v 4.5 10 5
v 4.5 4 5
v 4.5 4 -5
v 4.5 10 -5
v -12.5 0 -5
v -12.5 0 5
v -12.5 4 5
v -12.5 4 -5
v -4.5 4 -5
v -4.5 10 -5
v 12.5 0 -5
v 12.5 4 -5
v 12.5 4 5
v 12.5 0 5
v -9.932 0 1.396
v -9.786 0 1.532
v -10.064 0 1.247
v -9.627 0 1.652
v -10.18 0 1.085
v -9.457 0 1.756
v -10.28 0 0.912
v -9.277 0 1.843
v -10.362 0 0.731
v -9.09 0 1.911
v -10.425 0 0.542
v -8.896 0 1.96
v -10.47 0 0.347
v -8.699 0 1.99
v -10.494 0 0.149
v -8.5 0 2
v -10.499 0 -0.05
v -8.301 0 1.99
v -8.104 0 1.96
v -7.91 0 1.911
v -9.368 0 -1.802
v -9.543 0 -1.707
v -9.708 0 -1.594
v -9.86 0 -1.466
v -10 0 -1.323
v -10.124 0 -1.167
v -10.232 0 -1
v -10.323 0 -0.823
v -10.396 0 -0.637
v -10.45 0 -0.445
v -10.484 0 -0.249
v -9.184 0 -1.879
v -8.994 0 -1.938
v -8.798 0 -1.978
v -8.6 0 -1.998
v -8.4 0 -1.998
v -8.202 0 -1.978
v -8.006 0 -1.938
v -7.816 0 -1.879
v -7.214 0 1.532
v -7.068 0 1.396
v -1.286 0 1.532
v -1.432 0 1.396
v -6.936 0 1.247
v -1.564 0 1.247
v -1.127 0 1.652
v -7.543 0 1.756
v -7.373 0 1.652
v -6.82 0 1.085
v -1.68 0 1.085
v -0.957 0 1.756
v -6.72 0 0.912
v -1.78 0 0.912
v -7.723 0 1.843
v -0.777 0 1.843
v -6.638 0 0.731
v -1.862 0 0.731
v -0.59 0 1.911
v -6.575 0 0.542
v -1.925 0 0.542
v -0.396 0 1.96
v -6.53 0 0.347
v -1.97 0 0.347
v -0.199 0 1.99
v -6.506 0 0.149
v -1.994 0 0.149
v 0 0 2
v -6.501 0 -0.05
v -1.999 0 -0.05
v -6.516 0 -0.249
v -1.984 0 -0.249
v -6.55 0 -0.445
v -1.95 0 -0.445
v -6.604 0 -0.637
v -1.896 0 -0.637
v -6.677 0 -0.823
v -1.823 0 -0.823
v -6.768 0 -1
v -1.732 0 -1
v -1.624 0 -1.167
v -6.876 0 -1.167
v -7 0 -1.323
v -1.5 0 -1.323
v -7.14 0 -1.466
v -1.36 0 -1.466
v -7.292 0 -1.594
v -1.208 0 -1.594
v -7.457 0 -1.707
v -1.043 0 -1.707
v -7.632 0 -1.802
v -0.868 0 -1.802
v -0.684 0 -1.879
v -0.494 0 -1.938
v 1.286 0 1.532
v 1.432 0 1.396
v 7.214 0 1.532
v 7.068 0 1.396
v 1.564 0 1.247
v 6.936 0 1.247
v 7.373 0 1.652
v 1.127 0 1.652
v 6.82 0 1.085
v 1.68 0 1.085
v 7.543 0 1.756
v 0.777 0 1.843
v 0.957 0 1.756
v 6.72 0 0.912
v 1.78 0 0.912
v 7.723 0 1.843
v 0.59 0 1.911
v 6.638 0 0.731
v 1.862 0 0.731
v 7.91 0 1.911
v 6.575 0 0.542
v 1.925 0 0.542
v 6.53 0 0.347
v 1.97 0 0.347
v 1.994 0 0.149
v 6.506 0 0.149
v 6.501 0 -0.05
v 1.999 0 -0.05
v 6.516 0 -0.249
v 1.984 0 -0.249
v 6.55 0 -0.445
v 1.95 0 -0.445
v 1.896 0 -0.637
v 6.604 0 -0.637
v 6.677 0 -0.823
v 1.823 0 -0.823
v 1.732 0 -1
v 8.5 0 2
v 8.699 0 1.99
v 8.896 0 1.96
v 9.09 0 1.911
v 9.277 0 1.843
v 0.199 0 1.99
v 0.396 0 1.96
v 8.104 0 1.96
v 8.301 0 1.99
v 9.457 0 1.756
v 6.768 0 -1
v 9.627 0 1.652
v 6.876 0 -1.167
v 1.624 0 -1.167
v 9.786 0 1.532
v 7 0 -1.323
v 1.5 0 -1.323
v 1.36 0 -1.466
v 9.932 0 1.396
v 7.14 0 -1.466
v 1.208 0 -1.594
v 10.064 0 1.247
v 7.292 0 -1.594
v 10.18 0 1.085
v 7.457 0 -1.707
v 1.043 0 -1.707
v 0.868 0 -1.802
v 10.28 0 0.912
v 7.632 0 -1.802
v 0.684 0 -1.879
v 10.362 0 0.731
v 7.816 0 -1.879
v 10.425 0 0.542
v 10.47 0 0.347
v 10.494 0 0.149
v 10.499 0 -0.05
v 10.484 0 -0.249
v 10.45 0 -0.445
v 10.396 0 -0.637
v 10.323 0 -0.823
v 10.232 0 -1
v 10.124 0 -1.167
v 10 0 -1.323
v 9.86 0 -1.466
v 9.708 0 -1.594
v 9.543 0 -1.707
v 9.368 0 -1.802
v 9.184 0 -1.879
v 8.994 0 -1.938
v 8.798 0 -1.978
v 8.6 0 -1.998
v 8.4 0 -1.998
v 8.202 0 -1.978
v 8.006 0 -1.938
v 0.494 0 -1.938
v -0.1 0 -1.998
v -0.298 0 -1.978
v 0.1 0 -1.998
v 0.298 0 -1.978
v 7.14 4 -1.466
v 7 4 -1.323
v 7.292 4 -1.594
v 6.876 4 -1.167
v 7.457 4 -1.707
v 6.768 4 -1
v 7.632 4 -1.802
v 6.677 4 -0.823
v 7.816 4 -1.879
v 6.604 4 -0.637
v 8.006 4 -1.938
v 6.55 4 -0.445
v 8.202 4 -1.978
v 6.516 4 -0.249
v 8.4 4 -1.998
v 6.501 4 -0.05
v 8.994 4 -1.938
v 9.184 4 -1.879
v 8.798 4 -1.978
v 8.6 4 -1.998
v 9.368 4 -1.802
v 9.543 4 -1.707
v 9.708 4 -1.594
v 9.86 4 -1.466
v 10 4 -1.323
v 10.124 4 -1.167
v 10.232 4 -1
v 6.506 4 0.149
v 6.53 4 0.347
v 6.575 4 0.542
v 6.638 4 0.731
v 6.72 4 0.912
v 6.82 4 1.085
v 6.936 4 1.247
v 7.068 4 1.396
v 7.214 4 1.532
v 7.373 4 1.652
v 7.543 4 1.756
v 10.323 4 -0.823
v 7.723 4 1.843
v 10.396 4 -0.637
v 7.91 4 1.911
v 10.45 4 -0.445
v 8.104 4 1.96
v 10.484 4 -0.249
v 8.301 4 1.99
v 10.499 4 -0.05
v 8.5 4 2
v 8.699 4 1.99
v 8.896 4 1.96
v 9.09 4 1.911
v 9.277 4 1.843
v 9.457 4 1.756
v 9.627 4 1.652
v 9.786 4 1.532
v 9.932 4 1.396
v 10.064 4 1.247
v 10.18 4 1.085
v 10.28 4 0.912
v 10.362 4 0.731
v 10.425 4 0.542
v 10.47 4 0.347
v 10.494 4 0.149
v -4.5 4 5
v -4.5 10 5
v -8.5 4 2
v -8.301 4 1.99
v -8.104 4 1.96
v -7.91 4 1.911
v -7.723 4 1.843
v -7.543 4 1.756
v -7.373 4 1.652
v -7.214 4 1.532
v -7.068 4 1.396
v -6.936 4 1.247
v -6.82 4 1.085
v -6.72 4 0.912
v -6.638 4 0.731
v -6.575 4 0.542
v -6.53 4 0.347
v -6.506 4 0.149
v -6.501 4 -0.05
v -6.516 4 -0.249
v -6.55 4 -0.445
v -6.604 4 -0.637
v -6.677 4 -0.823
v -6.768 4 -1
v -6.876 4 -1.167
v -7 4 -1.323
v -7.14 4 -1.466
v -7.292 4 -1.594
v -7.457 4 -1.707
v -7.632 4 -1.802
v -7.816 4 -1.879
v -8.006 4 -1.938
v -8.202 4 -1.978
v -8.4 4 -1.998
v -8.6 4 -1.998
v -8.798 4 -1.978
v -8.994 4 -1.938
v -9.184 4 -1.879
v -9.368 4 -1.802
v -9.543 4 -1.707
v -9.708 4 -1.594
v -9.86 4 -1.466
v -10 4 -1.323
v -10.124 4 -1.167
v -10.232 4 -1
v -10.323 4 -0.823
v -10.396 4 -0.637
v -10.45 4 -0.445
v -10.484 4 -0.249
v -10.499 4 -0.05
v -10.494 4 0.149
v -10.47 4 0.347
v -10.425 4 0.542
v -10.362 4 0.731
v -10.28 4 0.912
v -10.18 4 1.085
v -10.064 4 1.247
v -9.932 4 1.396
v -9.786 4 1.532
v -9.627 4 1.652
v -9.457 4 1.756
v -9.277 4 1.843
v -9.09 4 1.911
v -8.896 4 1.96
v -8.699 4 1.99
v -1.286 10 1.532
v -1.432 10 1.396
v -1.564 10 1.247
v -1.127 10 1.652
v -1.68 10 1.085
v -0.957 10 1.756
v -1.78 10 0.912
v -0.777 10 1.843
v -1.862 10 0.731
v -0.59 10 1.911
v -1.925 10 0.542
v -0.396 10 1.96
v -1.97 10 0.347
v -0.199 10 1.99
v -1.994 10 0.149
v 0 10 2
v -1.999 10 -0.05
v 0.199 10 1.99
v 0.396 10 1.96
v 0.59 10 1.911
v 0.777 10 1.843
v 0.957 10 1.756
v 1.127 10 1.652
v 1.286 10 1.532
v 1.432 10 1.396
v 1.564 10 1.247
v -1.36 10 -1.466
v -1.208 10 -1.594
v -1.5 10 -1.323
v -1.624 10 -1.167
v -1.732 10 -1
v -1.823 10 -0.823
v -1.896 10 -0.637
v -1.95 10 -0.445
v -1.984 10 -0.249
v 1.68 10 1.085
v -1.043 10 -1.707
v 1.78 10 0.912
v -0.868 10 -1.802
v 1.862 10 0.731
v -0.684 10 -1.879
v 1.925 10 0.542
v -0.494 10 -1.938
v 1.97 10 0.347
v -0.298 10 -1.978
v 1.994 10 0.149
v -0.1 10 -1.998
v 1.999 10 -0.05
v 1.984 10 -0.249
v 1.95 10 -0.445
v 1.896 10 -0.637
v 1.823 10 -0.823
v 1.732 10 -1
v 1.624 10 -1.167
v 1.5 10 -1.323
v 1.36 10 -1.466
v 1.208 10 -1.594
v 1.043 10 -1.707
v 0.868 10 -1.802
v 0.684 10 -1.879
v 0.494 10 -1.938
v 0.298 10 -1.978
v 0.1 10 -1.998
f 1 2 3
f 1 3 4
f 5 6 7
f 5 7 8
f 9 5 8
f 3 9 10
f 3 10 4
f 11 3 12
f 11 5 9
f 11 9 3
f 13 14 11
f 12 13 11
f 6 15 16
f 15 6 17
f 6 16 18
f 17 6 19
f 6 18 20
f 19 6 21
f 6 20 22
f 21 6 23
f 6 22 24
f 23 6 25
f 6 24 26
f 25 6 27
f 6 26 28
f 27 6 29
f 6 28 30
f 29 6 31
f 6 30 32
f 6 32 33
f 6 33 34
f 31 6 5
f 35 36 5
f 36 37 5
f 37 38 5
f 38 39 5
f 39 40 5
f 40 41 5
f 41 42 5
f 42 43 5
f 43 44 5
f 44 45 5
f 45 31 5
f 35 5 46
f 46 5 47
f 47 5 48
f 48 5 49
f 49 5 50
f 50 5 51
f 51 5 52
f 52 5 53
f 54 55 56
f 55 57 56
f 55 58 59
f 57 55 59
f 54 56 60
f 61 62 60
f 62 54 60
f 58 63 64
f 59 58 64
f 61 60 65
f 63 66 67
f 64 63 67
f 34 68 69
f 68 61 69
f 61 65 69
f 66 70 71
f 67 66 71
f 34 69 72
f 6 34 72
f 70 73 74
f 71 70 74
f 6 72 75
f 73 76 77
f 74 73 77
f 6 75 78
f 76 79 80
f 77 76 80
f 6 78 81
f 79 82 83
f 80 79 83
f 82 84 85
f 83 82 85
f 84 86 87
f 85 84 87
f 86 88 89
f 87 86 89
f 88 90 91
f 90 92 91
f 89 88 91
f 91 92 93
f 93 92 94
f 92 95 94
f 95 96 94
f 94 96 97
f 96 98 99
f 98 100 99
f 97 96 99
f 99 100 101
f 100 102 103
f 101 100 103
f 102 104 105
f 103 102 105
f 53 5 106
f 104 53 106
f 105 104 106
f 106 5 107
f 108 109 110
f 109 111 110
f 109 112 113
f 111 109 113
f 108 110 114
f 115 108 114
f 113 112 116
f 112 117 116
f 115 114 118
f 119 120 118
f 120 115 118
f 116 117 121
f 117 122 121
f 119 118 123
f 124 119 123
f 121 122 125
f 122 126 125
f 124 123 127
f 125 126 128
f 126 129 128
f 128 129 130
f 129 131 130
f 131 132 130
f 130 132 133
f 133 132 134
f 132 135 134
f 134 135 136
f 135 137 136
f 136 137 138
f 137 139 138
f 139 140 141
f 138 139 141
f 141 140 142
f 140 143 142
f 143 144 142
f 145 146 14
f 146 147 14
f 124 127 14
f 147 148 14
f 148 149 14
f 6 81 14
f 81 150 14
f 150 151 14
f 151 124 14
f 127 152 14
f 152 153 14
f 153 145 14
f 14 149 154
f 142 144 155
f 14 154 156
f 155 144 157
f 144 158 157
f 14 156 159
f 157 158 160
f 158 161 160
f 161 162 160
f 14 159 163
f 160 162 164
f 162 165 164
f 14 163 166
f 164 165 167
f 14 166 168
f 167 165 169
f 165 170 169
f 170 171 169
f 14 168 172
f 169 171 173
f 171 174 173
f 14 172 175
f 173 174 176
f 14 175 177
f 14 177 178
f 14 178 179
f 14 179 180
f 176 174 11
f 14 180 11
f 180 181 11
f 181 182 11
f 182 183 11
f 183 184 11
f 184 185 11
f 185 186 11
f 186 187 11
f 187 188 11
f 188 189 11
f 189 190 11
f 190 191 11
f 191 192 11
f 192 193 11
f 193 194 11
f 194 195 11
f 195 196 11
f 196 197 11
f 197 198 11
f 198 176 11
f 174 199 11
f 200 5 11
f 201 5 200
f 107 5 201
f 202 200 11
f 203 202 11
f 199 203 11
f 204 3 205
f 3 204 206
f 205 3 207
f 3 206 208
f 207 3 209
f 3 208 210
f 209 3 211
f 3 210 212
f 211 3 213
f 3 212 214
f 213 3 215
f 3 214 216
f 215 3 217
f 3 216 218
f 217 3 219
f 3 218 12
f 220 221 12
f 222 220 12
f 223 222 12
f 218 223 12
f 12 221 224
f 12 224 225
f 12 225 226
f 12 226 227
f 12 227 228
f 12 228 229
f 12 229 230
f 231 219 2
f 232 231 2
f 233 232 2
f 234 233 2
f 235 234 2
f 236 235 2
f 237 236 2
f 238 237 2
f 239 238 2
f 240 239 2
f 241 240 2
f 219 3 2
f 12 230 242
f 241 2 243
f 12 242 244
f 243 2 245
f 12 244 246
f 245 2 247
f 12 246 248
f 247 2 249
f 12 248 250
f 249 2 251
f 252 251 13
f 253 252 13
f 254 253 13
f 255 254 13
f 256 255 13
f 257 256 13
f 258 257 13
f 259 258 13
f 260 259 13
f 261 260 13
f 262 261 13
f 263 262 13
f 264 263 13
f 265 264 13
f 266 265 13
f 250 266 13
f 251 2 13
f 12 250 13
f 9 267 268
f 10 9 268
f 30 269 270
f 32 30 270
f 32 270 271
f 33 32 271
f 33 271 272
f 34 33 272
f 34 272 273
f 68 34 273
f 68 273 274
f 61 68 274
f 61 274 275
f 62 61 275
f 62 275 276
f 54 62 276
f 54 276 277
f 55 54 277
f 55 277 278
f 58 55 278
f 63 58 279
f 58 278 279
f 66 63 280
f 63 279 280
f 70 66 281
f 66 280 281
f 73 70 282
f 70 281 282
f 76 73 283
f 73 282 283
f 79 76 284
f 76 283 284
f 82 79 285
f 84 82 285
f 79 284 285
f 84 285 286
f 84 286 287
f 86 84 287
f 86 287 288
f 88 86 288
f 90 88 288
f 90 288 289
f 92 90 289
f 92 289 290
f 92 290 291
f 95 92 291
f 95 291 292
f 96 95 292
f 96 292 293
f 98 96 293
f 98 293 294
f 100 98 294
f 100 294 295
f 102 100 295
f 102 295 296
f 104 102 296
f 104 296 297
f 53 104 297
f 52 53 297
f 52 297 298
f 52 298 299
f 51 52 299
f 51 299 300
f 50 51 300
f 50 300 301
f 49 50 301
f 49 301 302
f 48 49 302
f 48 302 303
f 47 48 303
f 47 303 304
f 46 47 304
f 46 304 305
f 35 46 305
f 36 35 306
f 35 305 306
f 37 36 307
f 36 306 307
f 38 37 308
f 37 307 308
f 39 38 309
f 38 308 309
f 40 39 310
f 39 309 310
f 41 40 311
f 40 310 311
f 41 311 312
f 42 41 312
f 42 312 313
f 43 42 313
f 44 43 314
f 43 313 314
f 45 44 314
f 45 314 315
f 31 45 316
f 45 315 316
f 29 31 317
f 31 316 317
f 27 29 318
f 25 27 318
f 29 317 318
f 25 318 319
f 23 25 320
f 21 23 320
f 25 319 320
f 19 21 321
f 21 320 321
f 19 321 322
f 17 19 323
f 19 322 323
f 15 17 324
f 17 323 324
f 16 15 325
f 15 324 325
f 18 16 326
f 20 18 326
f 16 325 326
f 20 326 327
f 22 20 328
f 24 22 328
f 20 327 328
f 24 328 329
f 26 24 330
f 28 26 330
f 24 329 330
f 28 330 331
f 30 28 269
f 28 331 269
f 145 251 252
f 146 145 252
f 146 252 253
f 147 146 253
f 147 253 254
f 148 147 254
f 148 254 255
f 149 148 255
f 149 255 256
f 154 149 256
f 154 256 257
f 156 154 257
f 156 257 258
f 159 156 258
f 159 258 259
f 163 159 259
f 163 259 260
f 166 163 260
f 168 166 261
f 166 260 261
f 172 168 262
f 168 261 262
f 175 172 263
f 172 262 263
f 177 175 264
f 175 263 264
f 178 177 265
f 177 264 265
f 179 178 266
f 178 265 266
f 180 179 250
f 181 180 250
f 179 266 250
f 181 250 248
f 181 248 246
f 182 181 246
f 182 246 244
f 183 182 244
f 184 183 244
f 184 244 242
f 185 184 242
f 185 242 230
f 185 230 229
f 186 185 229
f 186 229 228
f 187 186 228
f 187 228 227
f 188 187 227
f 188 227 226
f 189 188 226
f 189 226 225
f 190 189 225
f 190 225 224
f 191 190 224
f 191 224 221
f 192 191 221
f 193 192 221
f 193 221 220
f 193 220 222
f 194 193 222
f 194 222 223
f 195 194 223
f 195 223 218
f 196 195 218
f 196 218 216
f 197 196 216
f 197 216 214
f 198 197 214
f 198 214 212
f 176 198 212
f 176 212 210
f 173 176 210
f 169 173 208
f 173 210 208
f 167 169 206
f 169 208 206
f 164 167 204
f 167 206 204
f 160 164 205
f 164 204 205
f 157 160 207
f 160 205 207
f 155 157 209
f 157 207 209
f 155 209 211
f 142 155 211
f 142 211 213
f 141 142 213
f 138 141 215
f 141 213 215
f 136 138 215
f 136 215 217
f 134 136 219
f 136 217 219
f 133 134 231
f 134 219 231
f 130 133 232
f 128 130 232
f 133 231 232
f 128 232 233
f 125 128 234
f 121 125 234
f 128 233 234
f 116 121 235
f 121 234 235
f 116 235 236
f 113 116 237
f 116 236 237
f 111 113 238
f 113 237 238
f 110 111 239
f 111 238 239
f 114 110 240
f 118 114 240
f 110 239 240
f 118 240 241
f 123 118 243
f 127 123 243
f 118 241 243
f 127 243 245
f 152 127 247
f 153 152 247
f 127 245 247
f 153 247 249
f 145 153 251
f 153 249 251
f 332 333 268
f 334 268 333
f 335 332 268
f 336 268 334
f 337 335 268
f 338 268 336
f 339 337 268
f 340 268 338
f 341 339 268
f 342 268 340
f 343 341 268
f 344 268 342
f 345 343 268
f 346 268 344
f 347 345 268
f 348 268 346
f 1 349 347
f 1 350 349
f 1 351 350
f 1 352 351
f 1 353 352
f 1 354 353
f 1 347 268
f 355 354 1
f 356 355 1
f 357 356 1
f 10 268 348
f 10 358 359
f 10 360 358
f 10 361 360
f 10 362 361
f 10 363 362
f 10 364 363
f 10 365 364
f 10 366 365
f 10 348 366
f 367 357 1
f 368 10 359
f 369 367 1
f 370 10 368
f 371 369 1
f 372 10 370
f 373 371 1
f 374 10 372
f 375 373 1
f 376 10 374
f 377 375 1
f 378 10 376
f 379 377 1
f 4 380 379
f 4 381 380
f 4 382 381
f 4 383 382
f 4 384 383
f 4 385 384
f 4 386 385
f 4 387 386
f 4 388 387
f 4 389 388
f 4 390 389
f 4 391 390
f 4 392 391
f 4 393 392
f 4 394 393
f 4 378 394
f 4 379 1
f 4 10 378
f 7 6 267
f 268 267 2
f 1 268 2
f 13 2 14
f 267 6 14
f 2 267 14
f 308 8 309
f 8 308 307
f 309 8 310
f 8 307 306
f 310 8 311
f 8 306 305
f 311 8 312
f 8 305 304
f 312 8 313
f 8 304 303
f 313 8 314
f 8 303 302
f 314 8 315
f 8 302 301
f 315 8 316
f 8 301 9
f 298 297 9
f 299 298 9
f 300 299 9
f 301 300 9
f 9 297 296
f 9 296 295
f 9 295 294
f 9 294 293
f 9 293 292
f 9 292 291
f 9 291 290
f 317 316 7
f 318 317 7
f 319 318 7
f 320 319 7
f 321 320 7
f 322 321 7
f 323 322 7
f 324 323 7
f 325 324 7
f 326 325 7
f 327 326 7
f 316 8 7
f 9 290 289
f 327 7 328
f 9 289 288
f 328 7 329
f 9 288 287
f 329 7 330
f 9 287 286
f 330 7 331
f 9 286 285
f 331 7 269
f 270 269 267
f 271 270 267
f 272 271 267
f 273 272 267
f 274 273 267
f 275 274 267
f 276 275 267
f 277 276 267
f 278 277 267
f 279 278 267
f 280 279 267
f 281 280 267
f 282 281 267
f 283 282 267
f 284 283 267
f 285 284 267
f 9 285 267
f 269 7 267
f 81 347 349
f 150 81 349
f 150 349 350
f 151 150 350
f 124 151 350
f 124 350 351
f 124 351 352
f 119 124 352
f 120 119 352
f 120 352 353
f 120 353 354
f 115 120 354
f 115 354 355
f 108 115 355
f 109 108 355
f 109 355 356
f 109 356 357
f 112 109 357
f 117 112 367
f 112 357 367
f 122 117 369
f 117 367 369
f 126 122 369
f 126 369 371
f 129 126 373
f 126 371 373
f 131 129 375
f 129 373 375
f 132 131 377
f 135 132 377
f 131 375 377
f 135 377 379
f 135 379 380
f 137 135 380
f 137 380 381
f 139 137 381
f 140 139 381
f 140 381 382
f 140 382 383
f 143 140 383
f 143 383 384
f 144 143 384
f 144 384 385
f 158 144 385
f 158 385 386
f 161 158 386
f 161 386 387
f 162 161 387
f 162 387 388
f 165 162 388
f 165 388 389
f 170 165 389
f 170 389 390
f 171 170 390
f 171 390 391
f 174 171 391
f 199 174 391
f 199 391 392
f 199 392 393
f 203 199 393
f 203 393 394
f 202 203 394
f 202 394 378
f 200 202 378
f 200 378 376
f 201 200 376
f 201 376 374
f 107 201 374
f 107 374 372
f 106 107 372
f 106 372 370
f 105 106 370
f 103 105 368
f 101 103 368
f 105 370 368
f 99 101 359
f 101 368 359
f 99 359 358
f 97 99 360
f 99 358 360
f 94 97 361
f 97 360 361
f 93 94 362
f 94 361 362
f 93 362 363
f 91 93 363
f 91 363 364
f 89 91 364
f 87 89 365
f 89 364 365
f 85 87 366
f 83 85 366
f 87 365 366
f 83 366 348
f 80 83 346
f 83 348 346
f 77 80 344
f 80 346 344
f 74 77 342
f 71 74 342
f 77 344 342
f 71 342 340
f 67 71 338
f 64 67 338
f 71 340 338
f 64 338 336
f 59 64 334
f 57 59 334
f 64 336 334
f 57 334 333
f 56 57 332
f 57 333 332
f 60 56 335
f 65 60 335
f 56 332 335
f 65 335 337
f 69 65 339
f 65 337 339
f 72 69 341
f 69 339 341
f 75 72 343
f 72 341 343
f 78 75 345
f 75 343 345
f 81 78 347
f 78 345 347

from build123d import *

# Parameters (mm, degrees)
SKETCH1_W           = 25
SKETCH1_H           = 10
BOSS_EXTRUDE1_DEPTH = 10
SKETCH2_W           = 8
SKETCH2_H           = 6
CUT_EXTRUDE1_DEPTH  = 10
SKETCH3_R           = 2
CUT_EXTRUDE2_DEPTH  = 17.770509831
SKETCH4_R           = 2
CUT_EXTRUDE3_DEPTH  = 10


with BuildPart() as part:
    # Sketch1 → Boss-Extrude1 (new body)
    with BuildSketch(Plane(origin=(0, 0, 0), x_dir=(1, 0, 0), z_dir=(0, 1, 0))):
        Rectangle(SKETCH1_W, SKETCH1_H)
    extrude(amount=BOSS_EXTRUDE1_DEPTH)

    # Sketch2 → Cut-Extrude1 (cut)
    with BuildSketch(Plane.XY.offset(5)):
        with Locations((-8.5, 7)):
            Rectangle(SKETCH2_W, SKETCH2_H)
        with Locations((8.5, 7)):
            Rectangle(SKETCH2_W, SKETCH2_H)
    extrude(amount=-CUT_EXTRUDE1_DEPTH, mode=Mode.SUBTRACT)

    # Sketch3 → Cut-Extrude2 (cut, through all)
    with BuildSketch(Plane(origin=(0, 10, 0), x_dir=(1, 0, 0), z_dir=(0, 1, 0))):
        with Locations(Location((0, 0, 0), (0, 0, 270))):
            Circle(SKETCH3_R)
    extrude(amount=-CUT_EXTRUDE2_DEPTH, mode=Mode.SUBTRACT)

    # Sketch4 → Cut-Extrude3 (cut)
    with BuildSketch(Plane(origin=(0, 4, 0), x_dir=(1, 0, 0), z_dir=(0, 1, 0))):
        with Locations(Location((-8.5, 0, 0), (0, 0, 270))):
            Circle(SKETCH4_R)
        with Locations(Location((8.5, 0, 0), (0, 0, 270))):
            Circle(SKETCH4_R)
    extrude(amount=-CUT_EXTRUDE3_DEPTH, mode=Mode.SUBTRACT)


solid = part.part
